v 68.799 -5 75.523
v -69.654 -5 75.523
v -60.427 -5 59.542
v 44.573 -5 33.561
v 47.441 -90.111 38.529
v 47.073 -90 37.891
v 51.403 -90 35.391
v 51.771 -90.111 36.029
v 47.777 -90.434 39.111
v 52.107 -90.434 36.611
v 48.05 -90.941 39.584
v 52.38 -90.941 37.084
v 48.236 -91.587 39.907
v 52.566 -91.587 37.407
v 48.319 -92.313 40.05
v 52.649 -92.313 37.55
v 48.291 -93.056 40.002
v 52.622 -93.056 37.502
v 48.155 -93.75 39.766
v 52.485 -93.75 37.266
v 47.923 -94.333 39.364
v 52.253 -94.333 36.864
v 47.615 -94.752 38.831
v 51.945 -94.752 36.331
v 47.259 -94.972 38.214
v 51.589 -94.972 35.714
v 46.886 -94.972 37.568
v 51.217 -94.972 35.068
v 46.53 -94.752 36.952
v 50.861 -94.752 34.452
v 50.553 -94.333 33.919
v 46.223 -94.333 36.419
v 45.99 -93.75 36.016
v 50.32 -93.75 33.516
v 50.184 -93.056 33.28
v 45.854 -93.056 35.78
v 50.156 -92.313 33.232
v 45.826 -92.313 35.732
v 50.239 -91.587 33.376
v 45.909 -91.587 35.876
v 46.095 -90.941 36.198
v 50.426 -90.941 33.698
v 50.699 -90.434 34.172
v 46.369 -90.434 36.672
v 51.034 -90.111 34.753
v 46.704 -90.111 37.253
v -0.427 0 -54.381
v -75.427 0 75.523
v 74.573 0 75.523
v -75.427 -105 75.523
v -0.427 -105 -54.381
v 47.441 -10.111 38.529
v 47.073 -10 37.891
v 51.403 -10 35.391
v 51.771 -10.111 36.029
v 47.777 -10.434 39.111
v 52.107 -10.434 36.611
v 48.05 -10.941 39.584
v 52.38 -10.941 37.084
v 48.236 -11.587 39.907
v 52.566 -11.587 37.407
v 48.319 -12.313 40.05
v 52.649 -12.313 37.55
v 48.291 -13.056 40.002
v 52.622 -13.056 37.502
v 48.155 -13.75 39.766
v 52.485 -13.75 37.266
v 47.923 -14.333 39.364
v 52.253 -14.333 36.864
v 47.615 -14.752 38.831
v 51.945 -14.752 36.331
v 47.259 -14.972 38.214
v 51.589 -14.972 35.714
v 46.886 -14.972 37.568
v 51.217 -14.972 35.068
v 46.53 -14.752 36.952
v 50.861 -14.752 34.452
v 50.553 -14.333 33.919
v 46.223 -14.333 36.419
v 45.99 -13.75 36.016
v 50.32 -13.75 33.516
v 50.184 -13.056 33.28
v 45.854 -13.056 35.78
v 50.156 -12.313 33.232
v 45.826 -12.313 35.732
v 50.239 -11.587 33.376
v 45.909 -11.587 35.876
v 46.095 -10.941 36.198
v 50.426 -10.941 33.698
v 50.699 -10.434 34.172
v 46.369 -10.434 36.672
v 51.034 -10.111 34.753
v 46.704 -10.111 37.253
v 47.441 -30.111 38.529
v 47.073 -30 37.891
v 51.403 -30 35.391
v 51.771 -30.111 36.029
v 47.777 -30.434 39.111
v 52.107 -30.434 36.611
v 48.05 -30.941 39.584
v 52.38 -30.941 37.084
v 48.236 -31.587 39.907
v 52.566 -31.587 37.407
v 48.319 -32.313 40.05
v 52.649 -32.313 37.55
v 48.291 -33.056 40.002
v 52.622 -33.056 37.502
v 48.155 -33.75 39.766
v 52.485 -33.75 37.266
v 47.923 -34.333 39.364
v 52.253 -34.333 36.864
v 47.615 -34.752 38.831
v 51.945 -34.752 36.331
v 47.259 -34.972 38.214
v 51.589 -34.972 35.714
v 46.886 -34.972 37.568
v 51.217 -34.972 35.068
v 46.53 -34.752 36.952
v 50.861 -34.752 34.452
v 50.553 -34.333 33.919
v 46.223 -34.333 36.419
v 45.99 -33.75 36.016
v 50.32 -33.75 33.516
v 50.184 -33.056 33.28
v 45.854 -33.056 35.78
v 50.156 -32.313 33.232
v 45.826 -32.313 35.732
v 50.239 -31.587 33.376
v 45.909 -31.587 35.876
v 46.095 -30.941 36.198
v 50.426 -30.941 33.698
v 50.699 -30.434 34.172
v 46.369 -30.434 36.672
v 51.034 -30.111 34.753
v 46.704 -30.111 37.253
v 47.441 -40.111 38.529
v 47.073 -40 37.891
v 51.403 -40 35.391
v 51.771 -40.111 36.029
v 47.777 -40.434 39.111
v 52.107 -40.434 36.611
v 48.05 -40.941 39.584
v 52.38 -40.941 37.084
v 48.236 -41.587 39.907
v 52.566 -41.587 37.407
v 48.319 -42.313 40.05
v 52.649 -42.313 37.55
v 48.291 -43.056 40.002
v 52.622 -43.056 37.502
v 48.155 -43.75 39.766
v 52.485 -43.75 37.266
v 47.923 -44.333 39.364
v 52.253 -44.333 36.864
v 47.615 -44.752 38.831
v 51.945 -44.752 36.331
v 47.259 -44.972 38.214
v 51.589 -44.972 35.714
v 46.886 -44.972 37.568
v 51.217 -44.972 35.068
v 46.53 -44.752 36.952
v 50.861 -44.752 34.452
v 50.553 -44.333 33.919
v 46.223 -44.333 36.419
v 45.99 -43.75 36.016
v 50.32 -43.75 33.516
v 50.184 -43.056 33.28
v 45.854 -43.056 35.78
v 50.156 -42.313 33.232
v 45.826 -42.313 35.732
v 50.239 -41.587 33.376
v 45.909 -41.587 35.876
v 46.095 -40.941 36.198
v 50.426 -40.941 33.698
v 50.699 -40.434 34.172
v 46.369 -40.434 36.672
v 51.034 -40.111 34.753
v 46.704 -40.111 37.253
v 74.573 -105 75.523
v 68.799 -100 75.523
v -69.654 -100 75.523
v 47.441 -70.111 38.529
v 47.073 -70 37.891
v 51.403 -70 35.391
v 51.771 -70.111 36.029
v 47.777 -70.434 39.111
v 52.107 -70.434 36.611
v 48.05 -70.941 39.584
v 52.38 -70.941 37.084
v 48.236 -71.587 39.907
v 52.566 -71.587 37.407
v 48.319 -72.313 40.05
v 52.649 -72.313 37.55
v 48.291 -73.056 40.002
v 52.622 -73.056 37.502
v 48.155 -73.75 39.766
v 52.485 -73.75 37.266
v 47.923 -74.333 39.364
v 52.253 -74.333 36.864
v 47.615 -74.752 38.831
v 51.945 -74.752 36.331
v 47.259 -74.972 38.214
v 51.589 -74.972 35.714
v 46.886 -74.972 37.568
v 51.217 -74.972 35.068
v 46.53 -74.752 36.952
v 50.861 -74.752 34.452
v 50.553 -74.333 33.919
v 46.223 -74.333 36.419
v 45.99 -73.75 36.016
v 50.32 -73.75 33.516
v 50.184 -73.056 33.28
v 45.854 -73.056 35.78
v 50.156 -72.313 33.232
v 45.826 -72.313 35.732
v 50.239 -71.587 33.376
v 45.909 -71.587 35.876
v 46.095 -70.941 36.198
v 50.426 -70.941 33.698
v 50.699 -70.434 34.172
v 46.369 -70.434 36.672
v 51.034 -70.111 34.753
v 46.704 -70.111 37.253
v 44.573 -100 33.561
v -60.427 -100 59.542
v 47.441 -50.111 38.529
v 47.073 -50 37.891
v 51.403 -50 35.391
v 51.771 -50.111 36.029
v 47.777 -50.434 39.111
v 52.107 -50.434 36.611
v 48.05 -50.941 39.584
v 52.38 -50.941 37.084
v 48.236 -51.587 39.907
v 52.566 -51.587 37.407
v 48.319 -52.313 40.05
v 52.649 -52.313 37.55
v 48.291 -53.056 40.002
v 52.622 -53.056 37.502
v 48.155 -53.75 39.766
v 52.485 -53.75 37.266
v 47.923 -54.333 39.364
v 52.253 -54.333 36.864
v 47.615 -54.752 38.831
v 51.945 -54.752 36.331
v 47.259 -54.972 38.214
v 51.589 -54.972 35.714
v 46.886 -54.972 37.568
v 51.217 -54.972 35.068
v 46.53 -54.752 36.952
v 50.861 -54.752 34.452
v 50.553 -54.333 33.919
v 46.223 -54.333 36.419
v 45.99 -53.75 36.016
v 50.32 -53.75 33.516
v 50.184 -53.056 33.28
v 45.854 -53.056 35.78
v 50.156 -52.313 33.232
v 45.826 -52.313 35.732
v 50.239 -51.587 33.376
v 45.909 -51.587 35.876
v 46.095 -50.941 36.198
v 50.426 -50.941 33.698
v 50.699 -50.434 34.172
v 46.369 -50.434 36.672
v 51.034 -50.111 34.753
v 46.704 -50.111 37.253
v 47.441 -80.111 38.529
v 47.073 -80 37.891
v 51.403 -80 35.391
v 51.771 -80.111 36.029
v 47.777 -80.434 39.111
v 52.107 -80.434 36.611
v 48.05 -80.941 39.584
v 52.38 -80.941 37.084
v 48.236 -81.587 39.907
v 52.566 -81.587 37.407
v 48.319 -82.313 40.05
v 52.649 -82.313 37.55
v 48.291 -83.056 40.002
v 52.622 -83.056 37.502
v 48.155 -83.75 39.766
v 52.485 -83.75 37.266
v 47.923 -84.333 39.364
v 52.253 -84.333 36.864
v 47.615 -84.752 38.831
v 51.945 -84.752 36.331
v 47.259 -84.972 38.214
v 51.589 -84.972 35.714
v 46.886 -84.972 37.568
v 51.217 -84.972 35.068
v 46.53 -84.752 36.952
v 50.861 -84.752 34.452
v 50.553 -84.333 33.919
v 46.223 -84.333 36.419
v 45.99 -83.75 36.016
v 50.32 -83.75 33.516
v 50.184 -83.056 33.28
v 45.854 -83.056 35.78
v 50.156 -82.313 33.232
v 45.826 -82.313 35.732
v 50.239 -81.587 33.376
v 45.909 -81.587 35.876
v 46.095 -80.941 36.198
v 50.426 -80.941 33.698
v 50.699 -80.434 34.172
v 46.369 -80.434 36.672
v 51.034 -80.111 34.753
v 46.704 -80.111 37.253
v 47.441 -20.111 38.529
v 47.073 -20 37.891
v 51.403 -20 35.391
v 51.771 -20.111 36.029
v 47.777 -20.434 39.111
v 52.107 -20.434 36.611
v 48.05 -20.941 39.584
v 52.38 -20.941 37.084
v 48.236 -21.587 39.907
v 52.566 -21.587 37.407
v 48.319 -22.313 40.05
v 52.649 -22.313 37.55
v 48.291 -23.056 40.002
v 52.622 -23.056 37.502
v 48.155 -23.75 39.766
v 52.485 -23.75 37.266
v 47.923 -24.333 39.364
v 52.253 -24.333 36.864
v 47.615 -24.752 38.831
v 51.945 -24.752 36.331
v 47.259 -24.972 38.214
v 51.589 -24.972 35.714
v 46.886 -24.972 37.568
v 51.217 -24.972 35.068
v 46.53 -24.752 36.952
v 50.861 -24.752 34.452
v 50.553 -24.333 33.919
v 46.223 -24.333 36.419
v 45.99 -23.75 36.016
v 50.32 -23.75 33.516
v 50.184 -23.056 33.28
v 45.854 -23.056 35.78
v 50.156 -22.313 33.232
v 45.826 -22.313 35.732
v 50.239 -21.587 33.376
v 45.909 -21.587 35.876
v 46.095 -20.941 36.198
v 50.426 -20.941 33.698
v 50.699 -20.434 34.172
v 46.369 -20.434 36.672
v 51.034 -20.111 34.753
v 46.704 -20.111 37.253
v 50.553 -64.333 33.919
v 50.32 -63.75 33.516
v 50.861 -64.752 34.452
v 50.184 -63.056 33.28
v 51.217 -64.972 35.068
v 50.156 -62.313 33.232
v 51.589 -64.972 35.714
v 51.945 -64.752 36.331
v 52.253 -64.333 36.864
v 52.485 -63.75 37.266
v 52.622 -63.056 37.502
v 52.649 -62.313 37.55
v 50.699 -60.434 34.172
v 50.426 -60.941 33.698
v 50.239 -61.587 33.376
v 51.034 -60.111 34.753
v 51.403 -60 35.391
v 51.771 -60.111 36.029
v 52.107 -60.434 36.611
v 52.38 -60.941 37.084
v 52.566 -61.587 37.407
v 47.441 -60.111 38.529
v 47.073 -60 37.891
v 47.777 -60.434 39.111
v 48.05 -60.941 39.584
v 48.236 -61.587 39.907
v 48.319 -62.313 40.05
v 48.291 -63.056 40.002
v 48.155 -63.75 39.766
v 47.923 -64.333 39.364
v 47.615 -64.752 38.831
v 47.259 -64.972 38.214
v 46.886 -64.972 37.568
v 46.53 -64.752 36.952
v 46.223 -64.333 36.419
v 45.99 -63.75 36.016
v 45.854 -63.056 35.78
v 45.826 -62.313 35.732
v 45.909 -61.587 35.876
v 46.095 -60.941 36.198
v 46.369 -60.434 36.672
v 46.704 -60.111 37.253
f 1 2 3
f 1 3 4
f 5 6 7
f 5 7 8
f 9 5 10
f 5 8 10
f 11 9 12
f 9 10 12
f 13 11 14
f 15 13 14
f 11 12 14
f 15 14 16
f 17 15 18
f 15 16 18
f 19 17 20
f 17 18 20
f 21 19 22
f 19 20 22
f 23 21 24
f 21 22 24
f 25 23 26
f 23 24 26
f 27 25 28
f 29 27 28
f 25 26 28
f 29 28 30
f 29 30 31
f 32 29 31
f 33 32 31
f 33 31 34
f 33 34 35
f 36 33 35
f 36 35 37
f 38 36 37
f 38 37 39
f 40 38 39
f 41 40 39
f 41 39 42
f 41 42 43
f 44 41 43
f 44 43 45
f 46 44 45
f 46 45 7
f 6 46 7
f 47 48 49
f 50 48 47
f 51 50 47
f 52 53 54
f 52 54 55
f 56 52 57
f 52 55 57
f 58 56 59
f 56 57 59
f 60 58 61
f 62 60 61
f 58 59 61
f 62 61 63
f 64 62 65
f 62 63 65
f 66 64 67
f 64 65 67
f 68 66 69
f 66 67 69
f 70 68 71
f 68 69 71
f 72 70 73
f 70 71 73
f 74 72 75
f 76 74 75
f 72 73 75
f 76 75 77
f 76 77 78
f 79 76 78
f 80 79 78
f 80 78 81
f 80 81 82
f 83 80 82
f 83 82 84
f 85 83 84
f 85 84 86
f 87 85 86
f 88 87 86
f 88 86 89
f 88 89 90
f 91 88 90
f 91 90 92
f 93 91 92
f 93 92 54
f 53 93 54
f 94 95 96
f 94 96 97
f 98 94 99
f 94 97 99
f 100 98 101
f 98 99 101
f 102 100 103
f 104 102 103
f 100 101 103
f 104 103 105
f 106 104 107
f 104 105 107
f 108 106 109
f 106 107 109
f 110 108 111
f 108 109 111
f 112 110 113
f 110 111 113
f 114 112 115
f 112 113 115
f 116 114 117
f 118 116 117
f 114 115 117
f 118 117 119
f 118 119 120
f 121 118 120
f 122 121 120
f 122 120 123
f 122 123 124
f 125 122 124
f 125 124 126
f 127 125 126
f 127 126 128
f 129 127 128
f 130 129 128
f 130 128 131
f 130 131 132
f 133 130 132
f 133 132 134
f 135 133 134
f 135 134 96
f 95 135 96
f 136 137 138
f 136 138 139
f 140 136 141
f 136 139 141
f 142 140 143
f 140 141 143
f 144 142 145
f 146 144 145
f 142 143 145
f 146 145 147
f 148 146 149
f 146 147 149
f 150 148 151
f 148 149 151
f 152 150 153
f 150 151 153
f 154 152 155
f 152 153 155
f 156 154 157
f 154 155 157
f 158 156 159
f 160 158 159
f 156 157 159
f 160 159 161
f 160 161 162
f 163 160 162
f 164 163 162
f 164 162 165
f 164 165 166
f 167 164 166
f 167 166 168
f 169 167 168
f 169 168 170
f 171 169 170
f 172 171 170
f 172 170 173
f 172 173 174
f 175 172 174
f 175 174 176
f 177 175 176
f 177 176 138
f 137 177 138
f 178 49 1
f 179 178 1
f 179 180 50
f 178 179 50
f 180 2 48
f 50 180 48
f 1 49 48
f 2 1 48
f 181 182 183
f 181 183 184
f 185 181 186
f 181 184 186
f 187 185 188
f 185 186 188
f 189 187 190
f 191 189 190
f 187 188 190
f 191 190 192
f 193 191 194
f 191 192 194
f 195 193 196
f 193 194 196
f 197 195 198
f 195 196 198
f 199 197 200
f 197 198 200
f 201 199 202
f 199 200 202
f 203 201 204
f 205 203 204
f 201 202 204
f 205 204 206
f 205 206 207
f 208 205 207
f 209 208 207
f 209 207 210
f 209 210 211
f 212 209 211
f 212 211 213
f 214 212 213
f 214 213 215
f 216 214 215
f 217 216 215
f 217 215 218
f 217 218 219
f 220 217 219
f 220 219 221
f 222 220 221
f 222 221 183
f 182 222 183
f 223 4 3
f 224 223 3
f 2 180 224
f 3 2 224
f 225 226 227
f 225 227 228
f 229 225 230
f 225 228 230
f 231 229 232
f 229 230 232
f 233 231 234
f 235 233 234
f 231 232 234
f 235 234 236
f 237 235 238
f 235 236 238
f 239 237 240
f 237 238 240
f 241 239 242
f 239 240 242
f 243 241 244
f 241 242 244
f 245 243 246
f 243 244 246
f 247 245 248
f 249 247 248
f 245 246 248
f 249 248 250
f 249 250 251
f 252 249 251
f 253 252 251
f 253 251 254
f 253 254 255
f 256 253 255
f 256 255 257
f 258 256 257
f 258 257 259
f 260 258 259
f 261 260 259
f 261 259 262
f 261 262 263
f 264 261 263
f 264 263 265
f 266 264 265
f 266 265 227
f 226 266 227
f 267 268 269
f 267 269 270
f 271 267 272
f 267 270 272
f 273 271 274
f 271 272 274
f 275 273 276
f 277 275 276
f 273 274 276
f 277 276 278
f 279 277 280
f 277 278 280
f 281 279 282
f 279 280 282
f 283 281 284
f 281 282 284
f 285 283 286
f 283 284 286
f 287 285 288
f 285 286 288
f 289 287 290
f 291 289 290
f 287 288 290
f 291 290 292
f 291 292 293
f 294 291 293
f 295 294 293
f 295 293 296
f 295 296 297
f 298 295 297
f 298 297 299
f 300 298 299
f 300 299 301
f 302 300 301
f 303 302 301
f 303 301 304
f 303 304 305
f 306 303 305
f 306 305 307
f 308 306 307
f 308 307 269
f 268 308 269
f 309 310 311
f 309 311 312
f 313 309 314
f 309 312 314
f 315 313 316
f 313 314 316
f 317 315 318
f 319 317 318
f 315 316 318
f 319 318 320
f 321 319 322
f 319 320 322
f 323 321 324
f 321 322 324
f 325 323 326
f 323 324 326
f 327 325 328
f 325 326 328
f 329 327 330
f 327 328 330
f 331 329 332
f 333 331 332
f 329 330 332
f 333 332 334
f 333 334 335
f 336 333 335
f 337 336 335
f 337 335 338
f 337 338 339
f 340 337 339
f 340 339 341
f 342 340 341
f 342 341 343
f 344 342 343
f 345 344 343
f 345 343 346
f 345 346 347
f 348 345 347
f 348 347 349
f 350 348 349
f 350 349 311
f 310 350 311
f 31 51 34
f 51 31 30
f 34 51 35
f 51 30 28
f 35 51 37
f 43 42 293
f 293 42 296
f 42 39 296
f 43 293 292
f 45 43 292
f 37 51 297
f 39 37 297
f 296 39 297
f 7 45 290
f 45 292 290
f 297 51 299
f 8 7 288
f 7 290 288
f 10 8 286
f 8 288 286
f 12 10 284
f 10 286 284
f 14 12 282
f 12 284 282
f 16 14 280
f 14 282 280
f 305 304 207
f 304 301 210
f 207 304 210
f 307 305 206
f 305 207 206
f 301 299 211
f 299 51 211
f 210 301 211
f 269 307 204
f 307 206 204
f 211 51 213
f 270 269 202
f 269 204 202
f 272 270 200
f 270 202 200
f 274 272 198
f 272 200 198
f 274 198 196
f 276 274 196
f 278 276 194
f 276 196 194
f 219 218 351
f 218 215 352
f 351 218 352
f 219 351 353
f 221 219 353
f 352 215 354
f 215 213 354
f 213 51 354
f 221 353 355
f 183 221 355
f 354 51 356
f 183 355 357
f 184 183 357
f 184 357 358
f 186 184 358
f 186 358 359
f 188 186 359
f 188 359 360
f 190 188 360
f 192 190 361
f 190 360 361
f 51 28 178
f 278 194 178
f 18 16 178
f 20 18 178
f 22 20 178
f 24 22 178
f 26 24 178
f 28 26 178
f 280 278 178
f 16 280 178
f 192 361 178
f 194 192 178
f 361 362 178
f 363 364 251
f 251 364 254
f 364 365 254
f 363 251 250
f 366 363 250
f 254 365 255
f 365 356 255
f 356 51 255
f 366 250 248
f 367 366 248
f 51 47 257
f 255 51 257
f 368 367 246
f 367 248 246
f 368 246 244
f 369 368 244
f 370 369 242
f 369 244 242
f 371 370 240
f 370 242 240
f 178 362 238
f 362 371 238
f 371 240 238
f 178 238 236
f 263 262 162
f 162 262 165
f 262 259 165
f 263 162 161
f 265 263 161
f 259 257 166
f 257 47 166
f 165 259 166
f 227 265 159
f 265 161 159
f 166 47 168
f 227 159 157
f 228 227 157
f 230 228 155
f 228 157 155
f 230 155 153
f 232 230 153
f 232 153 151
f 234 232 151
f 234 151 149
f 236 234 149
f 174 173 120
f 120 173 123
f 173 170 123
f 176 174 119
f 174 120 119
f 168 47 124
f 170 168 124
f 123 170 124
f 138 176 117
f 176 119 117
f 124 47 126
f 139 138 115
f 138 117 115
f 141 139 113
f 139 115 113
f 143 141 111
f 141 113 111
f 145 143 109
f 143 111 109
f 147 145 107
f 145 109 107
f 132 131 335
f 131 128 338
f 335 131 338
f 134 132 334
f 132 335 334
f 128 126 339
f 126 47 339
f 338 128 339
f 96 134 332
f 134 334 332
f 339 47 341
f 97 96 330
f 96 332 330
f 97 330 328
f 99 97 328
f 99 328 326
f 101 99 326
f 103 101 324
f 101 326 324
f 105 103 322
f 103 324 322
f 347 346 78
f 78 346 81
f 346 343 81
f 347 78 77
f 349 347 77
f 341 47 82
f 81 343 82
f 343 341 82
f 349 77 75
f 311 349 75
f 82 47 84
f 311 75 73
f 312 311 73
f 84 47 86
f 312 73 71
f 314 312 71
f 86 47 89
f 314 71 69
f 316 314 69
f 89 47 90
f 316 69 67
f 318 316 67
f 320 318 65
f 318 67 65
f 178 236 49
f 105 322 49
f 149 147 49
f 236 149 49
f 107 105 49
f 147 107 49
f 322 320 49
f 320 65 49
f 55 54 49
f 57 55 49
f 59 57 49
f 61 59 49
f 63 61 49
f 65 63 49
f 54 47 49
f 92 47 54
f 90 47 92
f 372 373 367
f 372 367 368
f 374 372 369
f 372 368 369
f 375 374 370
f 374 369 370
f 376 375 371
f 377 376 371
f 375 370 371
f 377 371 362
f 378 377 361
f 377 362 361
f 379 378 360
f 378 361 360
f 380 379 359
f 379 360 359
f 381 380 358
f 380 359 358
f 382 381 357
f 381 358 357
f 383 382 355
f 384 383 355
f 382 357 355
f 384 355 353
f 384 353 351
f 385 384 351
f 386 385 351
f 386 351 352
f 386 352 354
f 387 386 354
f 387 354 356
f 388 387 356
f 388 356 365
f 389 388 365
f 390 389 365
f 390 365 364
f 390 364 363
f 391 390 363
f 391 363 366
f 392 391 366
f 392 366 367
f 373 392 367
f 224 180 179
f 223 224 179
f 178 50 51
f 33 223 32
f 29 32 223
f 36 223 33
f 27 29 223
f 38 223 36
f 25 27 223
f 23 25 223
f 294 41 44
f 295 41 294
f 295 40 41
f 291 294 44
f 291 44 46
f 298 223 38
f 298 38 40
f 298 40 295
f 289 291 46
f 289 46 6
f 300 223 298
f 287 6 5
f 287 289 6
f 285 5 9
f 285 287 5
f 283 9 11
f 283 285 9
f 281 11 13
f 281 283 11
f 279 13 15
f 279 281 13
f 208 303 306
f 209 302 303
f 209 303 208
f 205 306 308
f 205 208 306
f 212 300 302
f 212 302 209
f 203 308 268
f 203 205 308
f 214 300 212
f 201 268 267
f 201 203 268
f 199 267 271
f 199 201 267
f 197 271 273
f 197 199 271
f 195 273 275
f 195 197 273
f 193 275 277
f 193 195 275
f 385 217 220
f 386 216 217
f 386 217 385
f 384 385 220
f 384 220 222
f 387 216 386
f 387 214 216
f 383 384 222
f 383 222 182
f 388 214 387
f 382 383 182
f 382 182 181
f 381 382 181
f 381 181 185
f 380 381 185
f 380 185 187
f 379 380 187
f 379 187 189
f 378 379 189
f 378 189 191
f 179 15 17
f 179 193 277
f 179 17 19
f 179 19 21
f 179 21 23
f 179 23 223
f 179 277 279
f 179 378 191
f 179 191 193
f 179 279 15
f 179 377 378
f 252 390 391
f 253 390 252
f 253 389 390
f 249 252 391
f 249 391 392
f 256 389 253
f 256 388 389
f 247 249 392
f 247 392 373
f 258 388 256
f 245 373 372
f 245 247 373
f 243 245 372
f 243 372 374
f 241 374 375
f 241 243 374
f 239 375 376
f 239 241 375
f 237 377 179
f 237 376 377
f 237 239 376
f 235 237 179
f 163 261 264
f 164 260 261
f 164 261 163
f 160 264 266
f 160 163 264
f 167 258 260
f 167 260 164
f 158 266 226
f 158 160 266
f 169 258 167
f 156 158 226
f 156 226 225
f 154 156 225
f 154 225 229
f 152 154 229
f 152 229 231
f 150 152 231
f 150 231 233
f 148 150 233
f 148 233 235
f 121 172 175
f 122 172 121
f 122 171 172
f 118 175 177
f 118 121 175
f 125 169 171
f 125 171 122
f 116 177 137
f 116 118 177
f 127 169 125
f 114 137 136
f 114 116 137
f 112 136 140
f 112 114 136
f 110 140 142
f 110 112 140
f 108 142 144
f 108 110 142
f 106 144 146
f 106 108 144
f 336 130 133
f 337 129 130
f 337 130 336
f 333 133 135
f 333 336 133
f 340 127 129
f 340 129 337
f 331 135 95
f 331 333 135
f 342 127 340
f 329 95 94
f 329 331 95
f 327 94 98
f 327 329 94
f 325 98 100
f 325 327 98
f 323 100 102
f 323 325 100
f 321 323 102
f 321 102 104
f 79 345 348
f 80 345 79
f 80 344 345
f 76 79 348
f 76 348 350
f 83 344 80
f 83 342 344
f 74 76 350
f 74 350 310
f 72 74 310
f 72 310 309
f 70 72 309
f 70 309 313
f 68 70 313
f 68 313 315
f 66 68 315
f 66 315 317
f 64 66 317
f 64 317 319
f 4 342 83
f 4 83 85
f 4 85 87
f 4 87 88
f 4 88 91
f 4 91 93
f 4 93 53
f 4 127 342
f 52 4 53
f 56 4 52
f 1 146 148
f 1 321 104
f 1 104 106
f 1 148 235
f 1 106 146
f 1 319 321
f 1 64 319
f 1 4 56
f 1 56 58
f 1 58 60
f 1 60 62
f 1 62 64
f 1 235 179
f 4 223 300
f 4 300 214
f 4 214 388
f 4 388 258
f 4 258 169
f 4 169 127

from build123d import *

# Parameters (mm, degrees)
F1_DEPTH = 105
F2_T     = -5
F4_DEPTH = 95
F6_D     = 5


with BuildPart() as f1:
    # F0 (on Front) → F1 (new body)
    with BuildSketch(Plane.XZ):
        Polygon((74.5727300216, 75.5225419998), (-75.4272699784, 75.5225419998), (-0.4272699784, -54.3812685678), align=None)
    extrude(amount=F1_DEPTH)

    # F2
    f2_openings = [f1.faces().sort_by_distance(p)[0] for p in [
        (-0.42727, -52.5, 75.522542),
    ]]
    offset(amount=F2_T, openings=f2_openings)

    # F3 (on face) → F4 (join)
    with BuildSketch(Plane.XZ.offset(5)):
        Polygon((44.5727300216, 33.5610177728), (-60.4272699784, 59.5417798863), (-0.4272699784, -44.3812685678), align=None)
    extrude(amount=F4_DEPTH)

    # F6 (through all)
    with Locations(Plane(origin=(18.8972005322, 0, -10.9103038142), x_dir=(0, -1, 0), z_dir=(-0.8660254038, 0, 0.5))):
        with Locations((92.5, 56.3510589789), (82.5, 56.3510589789), (72.5, 56.3510589789), (62.5, 56.3510589789), (52.5, 56.3510589789), (42.5, 56.3510589789), (32.5, 56.3510589789), (22.5, 56.3510589789), (12.5, 56.3510589789)):
            Hole(F6_D / 2)


solid = f1.part
